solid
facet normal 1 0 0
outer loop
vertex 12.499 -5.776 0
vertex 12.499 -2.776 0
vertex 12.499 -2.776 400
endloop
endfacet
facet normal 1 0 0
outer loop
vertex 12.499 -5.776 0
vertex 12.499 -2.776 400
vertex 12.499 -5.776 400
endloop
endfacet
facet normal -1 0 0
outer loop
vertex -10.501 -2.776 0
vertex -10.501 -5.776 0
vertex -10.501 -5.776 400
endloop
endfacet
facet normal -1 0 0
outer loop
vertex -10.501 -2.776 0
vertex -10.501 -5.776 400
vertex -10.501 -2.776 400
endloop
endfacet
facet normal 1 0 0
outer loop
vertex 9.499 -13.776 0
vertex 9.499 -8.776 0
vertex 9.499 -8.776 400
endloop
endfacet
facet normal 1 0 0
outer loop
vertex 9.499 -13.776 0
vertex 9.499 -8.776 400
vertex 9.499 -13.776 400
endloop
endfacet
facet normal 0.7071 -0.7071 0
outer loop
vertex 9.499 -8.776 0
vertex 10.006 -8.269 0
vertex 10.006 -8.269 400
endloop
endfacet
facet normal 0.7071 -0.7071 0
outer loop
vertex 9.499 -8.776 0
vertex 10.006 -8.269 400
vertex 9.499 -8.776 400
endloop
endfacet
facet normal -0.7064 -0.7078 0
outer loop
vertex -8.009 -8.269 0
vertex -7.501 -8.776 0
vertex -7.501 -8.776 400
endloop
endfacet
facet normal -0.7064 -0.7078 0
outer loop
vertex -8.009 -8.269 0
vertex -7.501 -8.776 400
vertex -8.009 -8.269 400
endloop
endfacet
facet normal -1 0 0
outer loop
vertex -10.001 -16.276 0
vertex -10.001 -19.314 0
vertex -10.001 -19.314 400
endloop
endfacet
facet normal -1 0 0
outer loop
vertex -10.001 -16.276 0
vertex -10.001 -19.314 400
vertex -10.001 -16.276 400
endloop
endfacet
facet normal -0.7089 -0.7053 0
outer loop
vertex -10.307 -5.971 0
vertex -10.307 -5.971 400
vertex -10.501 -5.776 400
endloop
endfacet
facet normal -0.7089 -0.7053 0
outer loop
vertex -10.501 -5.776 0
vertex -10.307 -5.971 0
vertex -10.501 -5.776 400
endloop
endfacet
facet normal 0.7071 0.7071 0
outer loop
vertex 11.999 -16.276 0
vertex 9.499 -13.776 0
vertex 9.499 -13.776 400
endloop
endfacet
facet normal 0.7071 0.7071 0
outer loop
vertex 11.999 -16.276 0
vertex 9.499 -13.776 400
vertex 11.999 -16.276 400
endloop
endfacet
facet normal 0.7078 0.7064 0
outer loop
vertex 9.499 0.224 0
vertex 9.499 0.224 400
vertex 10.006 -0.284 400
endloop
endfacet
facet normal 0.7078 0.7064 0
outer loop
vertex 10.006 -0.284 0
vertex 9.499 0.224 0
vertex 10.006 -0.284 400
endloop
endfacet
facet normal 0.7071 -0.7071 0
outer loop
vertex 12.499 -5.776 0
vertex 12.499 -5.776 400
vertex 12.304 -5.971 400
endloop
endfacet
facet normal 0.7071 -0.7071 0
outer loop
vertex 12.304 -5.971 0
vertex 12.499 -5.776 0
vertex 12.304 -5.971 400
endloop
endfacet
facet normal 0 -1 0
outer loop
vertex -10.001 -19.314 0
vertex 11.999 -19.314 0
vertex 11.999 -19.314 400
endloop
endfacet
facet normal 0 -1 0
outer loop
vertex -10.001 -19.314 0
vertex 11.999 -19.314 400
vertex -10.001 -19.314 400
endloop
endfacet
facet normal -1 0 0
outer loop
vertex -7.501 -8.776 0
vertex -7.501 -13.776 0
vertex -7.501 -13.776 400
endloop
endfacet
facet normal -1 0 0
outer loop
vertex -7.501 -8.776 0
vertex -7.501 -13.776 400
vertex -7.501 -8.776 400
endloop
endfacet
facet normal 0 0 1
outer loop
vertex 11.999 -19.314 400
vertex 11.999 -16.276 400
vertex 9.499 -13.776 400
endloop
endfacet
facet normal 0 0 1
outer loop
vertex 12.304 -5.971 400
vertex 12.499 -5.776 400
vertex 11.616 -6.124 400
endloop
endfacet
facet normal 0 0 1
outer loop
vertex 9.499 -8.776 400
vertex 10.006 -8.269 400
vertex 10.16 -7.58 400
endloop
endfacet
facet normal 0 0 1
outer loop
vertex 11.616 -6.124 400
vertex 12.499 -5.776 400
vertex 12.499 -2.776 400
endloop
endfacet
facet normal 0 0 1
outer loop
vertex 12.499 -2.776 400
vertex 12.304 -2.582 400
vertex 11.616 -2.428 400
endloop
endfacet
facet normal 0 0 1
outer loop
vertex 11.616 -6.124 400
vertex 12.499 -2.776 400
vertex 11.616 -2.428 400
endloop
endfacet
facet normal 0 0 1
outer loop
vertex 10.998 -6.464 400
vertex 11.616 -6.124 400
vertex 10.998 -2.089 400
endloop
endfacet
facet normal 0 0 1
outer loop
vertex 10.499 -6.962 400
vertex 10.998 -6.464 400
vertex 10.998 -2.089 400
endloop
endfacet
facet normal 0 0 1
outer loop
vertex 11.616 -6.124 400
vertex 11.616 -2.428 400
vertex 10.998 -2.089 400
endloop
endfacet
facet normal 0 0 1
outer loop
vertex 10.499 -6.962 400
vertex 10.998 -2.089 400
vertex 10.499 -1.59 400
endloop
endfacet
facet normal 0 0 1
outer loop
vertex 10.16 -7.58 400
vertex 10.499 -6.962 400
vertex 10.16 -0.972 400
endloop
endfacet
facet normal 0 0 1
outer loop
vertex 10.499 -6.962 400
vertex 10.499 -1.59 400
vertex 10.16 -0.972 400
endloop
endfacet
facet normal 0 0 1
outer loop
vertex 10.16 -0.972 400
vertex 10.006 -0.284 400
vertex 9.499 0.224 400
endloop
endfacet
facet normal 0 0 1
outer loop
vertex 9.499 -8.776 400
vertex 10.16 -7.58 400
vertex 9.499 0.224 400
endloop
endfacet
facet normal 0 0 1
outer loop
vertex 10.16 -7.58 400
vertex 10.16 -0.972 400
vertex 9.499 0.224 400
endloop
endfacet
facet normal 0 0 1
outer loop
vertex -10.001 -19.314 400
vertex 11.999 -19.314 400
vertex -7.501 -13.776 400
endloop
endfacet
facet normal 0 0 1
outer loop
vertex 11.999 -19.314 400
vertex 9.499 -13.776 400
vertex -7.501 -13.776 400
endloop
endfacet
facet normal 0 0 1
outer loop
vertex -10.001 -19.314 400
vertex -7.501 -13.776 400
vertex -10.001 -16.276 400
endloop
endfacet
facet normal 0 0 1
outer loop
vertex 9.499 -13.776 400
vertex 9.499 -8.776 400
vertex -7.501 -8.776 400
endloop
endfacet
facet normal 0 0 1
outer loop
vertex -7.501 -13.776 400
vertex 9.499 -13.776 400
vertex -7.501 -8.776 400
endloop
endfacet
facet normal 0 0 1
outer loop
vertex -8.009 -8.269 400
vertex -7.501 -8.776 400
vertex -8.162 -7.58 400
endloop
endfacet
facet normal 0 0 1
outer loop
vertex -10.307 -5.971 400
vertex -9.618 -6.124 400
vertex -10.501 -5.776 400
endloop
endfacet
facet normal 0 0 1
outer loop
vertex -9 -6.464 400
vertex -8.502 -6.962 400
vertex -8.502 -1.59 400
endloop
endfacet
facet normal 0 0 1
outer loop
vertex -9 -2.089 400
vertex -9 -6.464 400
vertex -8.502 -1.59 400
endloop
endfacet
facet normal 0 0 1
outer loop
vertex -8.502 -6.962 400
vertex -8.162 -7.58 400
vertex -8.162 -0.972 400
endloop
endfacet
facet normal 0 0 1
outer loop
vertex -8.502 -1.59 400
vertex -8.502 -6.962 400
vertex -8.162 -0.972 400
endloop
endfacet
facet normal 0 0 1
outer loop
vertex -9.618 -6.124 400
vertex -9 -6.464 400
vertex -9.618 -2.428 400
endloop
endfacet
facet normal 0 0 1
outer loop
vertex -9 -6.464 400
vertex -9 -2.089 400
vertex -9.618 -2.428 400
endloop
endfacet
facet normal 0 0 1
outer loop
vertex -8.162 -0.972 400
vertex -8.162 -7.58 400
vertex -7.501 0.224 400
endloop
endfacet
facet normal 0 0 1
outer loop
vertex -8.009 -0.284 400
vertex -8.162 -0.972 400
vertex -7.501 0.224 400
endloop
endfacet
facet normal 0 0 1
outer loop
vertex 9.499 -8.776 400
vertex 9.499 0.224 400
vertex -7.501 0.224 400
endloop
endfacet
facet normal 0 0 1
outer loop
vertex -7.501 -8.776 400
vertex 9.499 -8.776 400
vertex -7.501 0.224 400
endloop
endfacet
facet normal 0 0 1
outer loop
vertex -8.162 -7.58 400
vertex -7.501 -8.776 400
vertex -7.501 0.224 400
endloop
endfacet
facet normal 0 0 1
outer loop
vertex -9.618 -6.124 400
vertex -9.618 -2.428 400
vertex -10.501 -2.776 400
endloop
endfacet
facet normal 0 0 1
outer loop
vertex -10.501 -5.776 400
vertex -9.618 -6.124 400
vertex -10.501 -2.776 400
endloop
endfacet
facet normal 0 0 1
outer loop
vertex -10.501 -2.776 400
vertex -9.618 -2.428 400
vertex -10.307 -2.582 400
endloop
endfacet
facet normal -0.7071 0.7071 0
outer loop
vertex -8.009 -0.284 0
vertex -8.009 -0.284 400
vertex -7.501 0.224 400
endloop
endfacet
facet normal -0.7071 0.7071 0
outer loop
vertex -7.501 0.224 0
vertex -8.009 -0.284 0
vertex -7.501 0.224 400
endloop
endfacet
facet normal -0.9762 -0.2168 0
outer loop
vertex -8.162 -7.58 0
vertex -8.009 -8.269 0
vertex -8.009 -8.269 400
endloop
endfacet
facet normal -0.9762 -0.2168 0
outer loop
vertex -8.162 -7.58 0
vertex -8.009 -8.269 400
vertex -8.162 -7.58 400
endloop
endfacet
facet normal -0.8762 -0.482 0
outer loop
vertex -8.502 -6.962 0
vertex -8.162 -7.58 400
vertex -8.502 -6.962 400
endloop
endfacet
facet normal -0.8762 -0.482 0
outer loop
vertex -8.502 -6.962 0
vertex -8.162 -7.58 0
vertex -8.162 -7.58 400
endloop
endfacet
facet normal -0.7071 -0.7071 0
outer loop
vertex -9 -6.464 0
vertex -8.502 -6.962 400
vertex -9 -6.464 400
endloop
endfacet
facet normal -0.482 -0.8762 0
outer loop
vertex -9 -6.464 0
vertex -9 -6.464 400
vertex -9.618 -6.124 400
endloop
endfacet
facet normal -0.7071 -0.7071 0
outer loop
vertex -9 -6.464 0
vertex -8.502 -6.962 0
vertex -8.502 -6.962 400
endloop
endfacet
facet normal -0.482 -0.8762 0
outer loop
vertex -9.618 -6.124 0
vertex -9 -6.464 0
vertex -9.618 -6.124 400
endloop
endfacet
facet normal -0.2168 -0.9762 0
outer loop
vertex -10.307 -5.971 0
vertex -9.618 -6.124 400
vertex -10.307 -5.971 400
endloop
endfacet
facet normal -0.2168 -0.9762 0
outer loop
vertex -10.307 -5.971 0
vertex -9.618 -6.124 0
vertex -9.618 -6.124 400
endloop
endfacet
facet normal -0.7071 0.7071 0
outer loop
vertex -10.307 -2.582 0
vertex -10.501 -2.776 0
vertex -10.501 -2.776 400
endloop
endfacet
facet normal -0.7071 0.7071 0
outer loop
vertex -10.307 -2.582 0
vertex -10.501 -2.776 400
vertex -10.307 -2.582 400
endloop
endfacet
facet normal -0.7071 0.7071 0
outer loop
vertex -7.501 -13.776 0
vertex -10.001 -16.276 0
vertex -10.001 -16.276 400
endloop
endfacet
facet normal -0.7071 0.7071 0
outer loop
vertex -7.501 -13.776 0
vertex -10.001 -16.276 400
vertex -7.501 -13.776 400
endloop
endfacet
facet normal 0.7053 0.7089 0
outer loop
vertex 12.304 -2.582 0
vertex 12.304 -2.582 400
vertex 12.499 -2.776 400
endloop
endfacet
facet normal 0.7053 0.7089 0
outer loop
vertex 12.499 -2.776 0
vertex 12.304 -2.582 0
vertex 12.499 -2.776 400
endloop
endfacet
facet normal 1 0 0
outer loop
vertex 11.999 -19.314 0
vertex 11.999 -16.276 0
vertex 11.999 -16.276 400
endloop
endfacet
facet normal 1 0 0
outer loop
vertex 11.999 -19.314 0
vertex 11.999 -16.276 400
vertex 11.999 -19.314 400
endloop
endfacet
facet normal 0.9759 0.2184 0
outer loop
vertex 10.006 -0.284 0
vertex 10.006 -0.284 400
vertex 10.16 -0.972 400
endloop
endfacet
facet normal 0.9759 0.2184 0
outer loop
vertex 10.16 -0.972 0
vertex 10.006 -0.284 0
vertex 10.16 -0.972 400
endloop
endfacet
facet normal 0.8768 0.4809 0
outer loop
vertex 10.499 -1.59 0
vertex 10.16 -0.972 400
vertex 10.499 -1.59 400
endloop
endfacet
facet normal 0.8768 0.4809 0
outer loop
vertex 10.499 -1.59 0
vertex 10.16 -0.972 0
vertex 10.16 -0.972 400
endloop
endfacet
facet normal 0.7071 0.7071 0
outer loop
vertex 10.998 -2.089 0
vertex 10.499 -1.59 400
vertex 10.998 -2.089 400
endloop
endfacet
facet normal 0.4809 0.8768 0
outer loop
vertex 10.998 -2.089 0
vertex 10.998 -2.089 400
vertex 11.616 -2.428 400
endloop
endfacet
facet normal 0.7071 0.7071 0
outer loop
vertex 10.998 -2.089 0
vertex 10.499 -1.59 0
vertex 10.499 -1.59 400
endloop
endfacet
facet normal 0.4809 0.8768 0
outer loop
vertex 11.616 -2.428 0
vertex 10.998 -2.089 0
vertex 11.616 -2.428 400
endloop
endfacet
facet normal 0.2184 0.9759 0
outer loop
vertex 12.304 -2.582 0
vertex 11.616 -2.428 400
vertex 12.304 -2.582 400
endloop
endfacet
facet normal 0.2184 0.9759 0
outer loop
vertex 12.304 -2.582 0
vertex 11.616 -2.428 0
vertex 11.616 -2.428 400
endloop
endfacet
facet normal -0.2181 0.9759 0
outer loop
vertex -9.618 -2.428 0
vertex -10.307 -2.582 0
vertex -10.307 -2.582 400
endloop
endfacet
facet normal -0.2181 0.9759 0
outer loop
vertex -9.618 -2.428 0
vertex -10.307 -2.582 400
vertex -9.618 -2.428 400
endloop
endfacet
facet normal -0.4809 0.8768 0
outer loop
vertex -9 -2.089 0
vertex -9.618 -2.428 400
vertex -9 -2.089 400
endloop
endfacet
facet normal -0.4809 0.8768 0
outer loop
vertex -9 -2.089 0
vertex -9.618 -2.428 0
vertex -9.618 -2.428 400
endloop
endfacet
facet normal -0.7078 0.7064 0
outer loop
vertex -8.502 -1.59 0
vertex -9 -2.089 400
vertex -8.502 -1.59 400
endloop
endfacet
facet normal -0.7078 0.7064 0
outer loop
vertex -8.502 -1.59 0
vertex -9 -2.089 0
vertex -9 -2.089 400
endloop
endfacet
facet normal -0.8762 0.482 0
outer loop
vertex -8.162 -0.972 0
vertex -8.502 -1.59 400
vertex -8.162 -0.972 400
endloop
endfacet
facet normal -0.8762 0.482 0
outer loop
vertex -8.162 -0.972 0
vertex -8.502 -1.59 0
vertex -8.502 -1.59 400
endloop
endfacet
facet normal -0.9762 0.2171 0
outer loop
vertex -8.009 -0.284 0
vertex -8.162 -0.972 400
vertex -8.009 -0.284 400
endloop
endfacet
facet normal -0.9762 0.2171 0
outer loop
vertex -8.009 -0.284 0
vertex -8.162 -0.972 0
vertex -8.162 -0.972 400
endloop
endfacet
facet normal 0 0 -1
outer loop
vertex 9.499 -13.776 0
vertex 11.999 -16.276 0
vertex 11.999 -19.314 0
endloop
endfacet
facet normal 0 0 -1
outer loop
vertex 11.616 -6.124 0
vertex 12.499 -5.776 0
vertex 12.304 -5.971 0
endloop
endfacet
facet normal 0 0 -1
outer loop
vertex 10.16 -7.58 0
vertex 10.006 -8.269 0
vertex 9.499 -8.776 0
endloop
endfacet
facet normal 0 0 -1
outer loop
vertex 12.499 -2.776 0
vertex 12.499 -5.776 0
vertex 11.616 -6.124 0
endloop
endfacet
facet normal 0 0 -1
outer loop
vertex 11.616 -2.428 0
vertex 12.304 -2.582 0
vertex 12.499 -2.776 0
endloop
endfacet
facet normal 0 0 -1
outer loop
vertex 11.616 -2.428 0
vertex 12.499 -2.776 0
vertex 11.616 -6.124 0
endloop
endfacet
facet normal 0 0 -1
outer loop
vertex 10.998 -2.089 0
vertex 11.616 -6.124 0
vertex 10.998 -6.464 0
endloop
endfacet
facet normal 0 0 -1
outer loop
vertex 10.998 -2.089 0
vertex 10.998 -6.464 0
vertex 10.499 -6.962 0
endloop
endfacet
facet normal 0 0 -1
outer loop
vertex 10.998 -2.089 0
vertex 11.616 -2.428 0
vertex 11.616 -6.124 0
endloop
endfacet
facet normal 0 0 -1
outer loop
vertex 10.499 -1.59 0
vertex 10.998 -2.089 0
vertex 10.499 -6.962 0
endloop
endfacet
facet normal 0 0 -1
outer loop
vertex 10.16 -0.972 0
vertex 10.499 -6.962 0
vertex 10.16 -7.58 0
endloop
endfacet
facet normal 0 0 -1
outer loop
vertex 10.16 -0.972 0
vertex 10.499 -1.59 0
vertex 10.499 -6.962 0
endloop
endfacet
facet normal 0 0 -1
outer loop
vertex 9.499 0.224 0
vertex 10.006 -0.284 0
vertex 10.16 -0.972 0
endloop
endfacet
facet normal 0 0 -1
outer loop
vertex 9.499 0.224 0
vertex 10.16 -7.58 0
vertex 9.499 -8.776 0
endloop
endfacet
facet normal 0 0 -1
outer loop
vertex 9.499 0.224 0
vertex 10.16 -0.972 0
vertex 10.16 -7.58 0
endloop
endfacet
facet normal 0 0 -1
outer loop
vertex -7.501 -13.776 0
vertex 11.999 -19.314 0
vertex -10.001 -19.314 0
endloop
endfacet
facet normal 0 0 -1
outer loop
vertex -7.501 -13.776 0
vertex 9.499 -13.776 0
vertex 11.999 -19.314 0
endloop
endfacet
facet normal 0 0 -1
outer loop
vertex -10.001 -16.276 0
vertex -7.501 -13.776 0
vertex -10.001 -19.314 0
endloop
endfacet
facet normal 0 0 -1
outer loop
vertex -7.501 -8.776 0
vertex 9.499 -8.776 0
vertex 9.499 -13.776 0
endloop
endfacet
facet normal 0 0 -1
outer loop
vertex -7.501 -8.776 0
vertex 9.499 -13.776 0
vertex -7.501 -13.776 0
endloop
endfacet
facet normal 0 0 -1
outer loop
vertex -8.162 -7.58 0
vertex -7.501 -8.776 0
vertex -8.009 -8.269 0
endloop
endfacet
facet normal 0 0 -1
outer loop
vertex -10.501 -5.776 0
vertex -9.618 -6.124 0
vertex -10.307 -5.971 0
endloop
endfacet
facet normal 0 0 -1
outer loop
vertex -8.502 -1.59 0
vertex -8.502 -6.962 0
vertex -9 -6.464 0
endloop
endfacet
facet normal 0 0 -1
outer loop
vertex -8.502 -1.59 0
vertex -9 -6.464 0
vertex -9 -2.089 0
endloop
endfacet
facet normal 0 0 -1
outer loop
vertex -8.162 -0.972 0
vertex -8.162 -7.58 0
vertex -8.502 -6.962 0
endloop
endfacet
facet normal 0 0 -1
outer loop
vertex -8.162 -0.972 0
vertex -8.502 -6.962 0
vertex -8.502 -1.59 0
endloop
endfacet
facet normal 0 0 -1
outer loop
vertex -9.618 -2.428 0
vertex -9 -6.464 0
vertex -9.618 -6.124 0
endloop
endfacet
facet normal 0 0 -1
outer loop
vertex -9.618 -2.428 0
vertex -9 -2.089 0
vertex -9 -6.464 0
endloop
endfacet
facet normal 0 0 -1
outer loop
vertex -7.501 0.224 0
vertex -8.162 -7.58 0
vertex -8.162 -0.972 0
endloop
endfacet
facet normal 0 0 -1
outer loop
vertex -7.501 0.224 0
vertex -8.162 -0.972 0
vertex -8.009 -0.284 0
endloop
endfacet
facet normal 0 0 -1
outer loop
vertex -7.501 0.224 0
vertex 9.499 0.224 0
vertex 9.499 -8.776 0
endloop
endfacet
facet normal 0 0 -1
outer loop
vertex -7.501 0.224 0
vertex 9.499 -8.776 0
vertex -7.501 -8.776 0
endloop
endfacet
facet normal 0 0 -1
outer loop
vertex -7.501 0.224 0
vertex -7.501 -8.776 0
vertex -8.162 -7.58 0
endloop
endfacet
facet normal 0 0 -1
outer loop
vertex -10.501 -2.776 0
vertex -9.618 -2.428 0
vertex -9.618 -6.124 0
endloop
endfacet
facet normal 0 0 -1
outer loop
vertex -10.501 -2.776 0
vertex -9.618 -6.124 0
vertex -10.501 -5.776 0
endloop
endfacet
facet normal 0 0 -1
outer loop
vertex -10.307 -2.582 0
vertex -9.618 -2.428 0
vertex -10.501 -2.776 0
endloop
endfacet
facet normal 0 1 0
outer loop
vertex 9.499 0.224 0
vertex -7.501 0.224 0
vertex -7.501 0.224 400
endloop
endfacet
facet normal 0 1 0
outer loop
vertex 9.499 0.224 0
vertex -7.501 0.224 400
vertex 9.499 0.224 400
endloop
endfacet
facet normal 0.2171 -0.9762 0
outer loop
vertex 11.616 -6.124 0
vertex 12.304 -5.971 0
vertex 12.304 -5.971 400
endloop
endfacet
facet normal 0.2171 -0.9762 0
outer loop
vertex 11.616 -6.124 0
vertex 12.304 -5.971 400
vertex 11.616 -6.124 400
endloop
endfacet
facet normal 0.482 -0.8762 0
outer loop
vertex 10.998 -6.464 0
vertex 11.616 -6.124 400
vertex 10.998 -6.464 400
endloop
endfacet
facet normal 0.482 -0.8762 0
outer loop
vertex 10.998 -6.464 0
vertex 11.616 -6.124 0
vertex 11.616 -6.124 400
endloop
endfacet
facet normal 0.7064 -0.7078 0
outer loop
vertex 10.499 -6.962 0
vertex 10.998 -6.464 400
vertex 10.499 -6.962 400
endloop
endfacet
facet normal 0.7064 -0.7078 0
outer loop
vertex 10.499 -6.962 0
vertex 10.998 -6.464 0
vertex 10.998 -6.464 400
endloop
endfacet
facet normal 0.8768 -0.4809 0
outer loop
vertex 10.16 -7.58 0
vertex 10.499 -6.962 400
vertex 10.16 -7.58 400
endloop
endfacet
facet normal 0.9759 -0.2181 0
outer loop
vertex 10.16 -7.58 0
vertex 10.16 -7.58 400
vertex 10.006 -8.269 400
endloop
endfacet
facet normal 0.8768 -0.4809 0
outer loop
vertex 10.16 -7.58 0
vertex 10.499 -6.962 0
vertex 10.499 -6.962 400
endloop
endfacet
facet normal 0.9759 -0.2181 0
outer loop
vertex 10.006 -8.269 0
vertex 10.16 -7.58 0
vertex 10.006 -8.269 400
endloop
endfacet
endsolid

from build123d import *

# Parameters (mm, degrees)
ESTRUSIONE_ESTRUSIONE1_DEPTH = 400


with BuildPart() as part:
    # Schizzo1 → Estrusione-Estrusione1 (new body)
    with BuildSketch(Plane.XY):
        with BuildLine():
            Line((-10.001211602, -16.276222172), (-7.501211602, -13.776222172))
            Line((-7.501211602, -13.776222172), (-7.501211602, -8.776222172))
            Line((-7.501211602, -8.776222172), (-8.008796188, -8.268637585))
            ThreePointArc((-8.008796188, -8.268637585), (-8.733444649, -6.695460987), (-10.306621247, -5.970812526))
            Line((-10.306621247, -5.970812526), (-10.501211602, -5.776222172))
            Line((-10.501211602, -5.776222172), (-10.501211602, -2.776222172))
            Line((-10.501211602, -2.776222172), (-10.306621247, -2.581631817))
            ThreePointArc((-10.306621247, -2.581631817), (-8.733444649, -1.856983356), (-8.008796188, -0.283806758))
            Line((-8.008796188, -0.283806758), (-7.501211602, 0.223777828))
            Line((-7.501211602, 0.223777828), (9.498788398, 0.223777828))
            Line((9.498788398, 0.223777828), (10.006372984, -0.283806758))
            ThreePointArc((10.006372984, -0.283806758), (10.731021445, -1.856983356), (12.304198043, -2.581631817))
            Line((12.304198043, -2.581631817), (12.498788398, -2.776222172))
            Line((12.498788398, -2.776222172), (12.498788398, -5.776222172))
            Line((12.498788398, -5.776222172), (12.304198043, -5.970812526))
            ThreePointArc((12.304198043, -5.970812526), (10.731021445, -6.695460987), (10.006372984, -8.268637585))
            Line((10.006372984, -8.268637585), (9.498788398, -8.776222172))
            Line((9.498788398, -8.776222172), (9.498788398, -13.776222172))
            Line((9.498788398, -13.776222172), (11.998788398, -16.276222172))
            Line((11.998788398, -16.276222172), (11.998788398, -19.314402932))
            Line((11.998788398, -19.314402932), (-10.001211602, -19.314402932))
            Line((-10.001211602, -19.314402932), (-10.001211602, -16.276222172))
        make_face()
    extrude(amount=ESTRUSIONE_ESTRUSIONE1_DEPTH)


solid = part.part
